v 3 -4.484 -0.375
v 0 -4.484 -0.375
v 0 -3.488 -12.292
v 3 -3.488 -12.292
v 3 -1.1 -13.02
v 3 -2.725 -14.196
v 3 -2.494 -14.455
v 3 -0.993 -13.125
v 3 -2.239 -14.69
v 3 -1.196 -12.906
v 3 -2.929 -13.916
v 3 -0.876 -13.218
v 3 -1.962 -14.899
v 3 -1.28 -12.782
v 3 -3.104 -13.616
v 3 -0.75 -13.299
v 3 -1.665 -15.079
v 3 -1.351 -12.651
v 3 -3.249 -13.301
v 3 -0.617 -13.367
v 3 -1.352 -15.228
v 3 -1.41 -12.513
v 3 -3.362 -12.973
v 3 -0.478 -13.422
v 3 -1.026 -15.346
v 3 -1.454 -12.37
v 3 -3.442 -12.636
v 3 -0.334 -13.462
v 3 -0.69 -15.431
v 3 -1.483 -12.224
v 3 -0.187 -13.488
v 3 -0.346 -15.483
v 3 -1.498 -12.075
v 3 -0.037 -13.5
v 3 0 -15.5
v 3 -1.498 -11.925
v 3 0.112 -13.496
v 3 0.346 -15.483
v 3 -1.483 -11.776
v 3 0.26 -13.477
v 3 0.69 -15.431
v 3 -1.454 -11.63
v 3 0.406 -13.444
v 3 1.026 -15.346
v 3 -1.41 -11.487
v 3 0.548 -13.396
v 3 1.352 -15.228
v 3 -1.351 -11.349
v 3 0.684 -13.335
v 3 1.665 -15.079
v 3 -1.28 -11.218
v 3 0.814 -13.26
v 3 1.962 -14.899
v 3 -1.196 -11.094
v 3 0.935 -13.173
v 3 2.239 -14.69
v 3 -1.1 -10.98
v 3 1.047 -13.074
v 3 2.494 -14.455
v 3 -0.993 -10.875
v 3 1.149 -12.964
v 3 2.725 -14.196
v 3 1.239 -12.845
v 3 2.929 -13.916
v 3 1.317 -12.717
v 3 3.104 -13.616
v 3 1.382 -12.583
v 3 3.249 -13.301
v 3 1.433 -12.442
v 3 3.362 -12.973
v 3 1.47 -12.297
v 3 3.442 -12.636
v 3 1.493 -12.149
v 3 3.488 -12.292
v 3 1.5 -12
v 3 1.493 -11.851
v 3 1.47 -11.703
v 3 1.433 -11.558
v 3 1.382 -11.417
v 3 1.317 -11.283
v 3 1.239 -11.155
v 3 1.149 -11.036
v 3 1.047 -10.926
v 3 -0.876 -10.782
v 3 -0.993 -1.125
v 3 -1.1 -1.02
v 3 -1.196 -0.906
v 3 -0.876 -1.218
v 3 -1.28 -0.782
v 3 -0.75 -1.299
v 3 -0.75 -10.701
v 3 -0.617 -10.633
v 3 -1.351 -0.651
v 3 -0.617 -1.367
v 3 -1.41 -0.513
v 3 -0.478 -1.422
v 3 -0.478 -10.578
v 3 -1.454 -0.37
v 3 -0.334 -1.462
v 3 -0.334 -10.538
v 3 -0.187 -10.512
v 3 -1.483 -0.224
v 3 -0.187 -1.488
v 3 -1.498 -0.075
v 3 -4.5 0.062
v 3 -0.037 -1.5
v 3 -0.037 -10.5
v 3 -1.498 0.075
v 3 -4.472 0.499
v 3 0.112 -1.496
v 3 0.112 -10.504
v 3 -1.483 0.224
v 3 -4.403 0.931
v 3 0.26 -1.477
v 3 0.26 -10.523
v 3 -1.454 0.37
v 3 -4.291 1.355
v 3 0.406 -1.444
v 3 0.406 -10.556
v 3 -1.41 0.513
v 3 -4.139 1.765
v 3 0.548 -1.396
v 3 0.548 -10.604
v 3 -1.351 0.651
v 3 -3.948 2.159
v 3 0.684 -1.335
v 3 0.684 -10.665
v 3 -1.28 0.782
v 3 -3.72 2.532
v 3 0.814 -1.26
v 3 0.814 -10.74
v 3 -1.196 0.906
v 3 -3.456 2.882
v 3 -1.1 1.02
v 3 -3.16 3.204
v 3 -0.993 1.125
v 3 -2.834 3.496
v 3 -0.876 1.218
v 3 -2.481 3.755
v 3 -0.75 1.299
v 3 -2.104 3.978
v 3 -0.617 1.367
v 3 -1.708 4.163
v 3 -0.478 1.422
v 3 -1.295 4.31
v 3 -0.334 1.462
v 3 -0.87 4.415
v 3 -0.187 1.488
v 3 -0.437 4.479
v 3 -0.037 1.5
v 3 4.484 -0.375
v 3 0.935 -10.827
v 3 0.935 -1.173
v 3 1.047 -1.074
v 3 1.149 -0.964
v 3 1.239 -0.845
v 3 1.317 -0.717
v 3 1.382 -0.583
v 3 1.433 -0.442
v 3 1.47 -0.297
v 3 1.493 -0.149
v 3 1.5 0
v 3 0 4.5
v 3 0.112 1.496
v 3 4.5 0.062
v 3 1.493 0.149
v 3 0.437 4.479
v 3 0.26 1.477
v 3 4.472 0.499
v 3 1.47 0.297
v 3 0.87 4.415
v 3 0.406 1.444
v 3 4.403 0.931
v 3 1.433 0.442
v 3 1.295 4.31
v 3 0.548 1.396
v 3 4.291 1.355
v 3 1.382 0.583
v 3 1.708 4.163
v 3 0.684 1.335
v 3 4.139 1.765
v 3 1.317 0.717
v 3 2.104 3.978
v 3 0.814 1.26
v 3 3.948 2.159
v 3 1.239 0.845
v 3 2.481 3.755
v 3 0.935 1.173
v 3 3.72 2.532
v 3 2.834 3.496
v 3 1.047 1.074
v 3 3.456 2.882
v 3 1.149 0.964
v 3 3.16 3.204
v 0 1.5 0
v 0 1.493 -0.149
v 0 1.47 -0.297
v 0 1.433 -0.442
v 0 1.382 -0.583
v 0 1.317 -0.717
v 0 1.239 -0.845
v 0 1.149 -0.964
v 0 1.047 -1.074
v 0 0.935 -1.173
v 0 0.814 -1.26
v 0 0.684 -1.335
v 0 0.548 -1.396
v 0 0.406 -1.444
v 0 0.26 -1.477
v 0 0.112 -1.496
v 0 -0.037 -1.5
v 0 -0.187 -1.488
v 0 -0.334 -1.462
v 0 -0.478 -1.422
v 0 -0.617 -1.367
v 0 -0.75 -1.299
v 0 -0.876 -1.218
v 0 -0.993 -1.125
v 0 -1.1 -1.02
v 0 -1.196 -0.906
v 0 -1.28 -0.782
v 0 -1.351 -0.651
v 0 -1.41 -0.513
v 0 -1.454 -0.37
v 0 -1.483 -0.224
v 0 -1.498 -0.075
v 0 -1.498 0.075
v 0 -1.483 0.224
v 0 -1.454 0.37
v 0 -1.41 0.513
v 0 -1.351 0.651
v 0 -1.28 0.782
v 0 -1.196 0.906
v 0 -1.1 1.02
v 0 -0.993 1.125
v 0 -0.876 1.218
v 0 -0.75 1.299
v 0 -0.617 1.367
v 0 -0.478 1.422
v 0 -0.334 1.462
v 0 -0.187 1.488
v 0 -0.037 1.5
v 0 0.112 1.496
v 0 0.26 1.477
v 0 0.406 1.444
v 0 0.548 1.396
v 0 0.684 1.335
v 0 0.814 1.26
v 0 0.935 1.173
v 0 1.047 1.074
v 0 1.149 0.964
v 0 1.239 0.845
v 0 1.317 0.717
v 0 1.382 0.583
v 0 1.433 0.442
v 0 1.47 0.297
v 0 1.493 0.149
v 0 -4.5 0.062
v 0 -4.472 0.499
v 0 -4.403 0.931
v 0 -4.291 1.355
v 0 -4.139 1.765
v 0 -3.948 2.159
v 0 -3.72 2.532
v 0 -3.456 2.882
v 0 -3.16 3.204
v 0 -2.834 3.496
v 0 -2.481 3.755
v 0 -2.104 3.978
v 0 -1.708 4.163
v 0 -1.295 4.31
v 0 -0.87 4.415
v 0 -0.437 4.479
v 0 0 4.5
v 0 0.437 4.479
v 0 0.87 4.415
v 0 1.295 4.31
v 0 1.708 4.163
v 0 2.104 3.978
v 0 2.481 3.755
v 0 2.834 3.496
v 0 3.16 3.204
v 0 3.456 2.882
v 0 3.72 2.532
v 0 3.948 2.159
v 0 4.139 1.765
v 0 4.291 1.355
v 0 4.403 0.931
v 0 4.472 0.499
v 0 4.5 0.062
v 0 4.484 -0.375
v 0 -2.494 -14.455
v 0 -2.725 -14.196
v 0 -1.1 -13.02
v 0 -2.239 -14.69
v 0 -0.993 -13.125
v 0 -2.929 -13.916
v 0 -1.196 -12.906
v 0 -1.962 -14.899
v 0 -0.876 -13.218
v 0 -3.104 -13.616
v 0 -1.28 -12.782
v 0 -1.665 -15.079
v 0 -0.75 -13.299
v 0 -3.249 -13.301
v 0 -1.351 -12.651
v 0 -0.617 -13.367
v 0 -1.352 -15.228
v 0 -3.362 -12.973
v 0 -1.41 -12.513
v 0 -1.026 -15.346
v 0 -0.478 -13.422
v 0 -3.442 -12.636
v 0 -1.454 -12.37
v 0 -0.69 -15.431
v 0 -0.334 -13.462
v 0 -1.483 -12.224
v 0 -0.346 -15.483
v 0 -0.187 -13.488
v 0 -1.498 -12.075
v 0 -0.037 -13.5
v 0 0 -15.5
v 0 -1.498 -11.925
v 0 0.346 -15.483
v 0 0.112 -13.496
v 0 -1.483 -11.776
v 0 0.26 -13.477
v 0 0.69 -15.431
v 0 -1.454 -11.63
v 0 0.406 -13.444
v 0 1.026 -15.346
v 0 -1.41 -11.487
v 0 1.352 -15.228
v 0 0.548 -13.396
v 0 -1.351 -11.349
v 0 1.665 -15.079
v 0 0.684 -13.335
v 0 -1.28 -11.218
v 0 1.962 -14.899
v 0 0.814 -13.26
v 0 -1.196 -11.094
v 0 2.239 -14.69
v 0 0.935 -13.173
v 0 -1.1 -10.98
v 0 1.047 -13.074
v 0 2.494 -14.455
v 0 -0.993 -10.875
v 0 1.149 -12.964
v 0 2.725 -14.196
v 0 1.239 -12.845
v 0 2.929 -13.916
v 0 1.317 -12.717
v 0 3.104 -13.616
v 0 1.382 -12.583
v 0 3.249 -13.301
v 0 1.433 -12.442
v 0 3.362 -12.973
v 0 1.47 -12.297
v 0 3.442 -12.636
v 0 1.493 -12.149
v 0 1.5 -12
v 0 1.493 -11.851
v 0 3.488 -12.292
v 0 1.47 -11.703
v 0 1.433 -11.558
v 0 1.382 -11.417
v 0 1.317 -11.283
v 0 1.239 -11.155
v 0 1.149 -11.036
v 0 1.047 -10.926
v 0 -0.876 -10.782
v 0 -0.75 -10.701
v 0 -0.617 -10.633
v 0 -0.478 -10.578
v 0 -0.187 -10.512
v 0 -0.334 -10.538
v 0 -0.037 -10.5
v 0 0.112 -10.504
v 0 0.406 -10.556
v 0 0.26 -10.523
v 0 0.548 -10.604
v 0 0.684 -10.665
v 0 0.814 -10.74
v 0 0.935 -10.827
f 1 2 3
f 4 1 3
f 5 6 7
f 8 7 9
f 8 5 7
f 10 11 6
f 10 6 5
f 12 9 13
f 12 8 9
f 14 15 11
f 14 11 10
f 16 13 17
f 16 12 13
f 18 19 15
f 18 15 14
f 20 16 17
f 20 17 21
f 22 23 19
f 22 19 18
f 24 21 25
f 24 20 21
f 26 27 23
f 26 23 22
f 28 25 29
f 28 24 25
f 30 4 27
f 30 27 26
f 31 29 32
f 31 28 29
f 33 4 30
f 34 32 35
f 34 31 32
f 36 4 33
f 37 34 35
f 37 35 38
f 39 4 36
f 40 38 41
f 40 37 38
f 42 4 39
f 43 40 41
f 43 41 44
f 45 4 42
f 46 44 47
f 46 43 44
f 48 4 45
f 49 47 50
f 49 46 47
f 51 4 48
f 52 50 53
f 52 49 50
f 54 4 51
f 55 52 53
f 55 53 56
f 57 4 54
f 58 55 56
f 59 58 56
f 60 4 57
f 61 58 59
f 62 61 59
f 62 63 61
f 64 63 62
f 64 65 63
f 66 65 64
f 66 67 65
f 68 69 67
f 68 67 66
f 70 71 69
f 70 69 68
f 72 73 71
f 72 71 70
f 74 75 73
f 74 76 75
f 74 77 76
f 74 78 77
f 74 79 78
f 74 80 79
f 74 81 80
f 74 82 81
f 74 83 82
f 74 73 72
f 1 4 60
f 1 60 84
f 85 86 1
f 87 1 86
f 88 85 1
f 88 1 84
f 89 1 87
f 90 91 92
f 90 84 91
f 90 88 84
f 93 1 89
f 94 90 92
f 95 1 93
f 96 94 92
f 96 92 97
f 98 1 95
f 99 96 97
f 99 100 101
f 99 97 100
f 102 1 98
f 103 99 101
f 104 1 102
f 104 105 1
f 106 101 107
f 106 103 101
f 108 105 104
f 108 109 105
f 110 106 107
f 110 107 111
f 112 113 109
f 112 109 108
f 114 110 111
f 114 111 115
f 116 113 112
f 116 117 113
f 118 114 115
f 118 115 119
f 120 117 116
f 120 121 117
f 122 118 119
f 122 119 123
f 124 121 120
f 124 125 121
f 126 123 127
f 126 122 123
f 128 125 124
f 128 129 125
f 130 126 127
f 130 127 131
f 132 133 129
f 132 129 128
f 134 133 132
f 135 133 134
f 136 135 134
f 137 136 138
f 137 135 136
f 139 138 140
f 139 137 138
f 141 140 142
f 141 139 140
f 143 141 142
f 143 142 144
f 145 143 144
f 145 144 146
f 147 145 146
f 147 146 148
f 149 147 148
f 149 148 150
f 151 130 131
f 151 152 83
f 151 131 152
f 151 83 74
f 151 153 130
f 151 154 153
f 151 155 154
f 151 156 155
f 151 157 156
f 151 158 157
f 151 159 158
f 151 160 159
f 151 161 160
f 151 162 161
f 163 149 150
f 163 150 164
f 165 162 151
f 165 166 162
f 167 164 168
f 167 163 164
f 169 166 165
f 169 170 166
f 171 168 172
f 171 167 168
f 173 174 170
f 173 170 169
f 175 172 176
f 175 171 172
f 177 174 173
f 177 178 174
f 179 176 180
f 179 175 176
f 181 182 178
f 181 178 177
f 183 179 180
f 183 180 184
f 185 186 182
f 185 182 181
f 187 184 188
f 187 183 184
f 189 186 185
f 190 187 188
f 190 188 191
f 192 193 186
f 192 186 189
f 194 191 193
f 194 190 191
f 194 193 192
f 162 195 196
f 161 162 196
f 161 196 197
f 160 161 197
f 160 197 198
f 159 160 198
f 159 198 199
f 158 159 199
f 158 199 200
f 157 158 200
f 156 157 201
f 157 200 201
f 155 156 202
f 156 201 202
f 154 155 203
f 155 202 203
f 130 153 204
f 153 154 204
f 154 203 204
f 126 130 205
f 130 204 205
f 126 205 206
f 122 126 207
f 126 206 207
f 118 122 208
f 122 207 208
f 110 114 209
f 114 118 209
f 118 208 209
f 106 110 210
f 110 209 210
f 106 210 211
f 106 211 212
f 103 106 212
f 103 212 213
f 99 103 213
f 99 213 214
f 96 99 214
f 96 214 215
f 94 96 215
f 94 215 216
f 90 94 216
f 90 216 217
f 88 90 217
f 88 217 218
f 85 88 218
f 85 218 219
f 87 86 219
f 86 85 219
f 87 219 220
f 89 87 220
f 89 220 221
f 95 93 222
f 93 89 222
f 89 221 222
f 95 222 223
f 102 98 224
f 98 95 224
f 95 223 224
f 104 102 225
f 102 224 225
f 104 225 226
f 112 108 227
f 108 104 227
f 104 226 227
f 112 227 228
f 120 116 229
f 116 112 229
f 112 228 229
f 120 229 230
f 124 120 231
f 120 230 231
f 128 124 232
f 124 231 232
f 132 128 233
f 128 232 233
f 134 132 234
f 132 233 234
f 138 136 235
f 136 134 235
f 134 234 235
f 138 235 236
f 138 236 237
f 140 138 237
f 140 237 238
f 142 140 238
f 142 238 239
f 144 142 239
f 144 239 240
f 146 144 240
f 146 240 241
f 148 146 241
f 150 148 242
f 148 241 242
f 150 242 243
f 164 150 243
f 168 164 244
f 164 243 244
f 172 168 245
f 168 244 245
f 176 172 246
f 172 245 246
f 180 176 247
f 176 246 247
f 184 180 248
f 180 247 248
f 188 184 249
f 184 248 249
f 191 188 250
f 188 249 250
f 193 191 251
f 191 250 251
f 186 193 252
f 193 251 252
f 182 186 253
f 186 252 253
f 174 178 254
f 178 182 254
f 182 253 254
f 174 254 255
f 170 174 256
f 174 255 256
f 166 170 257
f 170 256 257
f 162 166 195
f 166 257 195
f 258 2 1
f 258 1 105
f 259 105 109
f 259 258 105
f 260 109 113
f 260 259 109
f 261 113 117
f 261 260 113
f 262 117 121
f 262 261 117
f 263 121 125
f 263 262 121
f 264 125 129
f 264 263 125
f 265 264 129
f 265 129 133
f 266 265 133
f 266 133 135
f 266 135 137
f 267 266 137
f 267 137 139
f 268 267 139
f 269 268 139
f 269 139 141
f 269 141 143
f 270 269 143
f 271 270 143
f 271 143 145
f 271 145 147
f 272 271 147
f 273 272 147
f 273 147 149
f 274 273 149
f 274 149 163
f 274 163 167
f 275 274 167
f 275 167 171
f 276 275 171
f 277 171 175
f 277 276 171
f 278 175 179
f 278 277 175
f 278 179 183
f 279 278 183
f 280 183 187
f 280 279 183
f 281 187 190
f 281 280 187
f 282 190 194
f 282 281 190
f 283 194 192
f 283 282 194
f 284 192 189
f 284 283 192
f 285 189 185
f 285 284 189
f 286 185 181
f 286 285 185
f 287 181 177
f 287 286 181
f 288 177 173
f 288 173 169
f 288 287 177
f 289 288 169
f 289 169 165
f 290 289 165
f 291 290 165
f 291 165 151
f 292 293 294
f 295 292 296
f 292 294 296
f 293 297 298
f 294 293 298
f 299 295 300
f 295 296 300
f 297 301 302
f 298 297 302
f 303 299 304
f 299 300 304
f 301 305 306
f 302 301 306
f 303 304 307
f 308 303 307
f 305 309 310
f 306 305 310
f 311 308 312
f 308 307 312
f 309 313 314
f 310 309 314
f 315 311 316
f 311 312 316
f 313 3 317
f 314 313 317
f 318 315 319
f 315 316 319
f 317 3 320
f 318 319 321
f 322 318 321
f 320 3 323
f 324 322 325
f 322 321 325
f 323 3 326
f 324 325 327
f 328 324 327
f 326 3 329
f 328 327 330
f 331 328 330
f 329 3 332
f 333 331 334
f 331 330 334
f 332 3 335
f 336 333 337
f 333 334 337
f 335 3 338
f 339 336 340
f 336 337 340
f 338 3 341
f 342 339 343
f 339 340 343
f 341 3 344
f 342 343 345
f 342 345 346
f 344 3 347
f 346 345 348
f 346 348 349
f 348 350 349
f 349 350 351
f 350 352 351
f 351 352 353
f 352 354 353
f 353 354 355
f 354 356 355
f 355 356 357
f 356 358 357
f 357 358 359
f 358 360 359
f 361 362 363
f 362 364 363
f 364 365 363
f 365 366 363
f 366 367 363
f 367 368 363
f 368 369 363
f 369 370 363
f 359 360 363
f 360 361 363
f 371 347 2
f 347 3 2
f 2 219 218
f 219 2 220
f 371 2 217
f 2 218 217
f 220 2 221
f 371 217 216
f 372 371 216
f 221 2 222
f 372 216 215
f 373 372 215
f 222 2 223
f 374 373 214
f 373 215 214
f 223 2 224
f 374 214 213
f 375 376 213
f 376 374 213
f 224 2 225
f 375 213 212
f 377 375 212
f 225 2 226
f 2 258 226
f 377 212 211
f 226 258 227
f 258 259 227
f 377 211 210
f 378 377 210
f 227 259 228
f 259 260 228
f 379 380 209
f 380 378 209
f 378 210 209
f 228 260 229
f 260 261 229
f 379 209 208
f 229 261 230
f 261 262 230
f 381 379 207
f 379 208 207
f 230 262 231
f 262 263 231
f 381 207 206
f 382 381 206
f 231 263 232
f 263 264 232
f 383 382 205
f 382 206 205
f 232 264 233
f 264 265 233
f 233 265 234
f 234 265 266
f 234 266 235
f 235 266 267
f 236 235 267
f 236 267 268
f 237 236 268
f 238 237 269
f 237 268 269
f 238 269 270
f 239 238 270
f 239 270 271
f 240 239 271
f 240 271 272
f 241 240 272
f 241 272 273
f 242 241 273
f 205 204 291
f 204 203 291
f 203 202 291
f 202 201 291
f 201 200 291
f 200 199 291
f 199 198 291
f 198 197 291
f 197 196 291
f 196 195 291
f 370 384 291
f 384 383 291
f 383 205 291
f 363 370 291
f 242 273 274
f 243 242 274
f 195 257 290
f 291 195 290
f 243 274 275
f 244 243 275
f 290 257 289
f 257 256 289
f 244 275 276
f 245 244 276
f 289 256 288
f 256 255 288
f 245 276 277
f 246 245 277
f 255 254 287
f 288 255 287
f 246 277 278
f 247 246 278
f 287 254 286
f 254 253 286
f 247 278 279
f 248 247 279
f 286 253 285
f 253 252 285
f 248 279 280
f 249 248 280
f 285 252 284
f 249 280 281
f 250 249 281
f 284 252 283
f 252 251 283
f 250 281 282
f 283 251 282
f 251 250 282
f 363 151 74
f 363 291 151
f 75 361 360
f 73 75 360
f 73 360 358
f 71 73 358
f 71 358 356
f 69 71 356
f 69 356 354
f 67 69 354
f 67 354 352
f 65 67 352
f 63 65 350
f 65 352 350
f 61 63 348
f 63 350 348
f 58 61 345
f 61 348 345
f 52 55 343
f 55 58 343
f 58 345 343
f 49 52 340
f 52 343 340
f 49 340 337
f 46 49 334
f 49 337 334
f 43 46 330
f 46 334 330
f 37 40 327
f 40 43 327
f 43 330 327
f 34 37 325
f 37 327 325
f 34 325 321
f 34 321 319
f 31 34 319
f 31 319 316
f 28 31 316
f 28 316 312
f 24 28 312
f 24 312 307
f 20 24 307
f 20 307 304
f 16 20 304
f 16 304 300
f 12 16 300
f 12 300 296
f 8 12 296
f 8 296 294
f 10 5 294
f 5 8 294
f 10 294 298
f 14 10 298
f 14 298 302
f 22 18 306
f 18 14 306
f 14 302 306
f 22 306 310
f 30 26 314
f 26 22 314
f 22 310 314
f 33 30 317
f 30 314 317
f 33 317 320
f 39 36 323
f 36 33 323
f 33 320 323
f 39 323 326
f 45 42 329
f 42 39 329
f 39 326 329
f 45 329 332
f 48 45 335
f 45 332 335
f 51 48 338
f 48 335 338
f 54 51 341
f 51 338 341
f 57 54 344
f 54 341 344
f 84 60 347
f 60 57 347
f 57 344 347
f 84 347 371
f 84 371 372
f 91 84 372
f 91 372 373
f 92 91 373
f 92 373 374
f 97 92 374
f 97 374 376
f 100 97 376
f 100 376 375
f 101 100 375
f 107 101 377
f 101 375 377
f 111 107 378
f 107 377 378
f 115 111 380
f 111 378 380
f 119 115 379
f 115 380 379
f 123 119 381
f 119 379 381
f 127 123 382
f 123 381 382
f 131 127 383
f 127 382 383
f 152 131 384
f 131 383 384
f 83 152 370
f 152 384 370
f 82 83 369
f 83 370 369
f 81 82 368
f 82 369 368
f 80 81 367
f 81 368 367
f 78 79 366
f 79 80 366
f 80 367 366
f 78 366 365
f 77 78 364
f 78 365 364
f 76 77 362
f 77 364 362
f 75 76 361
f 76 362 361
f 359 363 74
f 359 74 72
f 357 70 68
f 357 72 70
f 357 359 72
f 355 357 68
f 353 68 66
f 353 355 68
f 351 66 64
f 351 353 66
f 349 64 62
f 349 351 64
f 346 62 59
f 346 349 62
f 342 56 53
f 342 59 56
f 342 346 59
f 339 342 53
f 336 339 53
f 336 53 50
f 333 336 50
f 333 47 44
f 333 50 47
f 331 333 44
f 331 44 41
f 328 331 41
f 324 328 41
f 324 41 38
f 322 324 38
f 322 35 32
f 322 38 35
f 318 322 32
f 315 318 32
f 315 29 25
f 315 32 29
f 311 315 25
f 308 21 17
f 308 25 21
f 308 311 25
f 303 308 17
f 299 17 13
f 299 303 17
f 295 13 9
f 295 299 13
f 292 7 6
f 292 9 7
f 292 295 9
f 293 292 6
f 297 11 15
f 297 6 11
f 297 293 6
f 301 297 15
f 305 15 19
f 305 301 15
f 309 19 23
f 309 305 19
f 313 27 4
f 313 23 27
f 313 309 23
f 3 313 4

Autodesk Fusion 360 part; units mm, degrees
sketch "Sketch1" plane through (0, 0, 0) normal (1, 0, 0) x (0, 1, 0)
  circle A0 centre (0, 0) radius 1.5
  circle A1 centre (0, -12) radius 1.5
  circle A2 centre (0, 0) radius 4.5
  circle A3 centre (0, -12) radius 3.5
  line L0 (-4.4843, -0.375) -> (-3.4878, -12.2917)
  line L1 (4.4843, -0.375) -> (3.4878, -12.2917)
  dimension "d1" = 3
  dimension "d2" = 3
  dimension "d3" = 12
  dimension "d4" = 7
  dimension "d5" = 9
extrude "Extrude1" add sketch "Sketch1" along normal blind 3
